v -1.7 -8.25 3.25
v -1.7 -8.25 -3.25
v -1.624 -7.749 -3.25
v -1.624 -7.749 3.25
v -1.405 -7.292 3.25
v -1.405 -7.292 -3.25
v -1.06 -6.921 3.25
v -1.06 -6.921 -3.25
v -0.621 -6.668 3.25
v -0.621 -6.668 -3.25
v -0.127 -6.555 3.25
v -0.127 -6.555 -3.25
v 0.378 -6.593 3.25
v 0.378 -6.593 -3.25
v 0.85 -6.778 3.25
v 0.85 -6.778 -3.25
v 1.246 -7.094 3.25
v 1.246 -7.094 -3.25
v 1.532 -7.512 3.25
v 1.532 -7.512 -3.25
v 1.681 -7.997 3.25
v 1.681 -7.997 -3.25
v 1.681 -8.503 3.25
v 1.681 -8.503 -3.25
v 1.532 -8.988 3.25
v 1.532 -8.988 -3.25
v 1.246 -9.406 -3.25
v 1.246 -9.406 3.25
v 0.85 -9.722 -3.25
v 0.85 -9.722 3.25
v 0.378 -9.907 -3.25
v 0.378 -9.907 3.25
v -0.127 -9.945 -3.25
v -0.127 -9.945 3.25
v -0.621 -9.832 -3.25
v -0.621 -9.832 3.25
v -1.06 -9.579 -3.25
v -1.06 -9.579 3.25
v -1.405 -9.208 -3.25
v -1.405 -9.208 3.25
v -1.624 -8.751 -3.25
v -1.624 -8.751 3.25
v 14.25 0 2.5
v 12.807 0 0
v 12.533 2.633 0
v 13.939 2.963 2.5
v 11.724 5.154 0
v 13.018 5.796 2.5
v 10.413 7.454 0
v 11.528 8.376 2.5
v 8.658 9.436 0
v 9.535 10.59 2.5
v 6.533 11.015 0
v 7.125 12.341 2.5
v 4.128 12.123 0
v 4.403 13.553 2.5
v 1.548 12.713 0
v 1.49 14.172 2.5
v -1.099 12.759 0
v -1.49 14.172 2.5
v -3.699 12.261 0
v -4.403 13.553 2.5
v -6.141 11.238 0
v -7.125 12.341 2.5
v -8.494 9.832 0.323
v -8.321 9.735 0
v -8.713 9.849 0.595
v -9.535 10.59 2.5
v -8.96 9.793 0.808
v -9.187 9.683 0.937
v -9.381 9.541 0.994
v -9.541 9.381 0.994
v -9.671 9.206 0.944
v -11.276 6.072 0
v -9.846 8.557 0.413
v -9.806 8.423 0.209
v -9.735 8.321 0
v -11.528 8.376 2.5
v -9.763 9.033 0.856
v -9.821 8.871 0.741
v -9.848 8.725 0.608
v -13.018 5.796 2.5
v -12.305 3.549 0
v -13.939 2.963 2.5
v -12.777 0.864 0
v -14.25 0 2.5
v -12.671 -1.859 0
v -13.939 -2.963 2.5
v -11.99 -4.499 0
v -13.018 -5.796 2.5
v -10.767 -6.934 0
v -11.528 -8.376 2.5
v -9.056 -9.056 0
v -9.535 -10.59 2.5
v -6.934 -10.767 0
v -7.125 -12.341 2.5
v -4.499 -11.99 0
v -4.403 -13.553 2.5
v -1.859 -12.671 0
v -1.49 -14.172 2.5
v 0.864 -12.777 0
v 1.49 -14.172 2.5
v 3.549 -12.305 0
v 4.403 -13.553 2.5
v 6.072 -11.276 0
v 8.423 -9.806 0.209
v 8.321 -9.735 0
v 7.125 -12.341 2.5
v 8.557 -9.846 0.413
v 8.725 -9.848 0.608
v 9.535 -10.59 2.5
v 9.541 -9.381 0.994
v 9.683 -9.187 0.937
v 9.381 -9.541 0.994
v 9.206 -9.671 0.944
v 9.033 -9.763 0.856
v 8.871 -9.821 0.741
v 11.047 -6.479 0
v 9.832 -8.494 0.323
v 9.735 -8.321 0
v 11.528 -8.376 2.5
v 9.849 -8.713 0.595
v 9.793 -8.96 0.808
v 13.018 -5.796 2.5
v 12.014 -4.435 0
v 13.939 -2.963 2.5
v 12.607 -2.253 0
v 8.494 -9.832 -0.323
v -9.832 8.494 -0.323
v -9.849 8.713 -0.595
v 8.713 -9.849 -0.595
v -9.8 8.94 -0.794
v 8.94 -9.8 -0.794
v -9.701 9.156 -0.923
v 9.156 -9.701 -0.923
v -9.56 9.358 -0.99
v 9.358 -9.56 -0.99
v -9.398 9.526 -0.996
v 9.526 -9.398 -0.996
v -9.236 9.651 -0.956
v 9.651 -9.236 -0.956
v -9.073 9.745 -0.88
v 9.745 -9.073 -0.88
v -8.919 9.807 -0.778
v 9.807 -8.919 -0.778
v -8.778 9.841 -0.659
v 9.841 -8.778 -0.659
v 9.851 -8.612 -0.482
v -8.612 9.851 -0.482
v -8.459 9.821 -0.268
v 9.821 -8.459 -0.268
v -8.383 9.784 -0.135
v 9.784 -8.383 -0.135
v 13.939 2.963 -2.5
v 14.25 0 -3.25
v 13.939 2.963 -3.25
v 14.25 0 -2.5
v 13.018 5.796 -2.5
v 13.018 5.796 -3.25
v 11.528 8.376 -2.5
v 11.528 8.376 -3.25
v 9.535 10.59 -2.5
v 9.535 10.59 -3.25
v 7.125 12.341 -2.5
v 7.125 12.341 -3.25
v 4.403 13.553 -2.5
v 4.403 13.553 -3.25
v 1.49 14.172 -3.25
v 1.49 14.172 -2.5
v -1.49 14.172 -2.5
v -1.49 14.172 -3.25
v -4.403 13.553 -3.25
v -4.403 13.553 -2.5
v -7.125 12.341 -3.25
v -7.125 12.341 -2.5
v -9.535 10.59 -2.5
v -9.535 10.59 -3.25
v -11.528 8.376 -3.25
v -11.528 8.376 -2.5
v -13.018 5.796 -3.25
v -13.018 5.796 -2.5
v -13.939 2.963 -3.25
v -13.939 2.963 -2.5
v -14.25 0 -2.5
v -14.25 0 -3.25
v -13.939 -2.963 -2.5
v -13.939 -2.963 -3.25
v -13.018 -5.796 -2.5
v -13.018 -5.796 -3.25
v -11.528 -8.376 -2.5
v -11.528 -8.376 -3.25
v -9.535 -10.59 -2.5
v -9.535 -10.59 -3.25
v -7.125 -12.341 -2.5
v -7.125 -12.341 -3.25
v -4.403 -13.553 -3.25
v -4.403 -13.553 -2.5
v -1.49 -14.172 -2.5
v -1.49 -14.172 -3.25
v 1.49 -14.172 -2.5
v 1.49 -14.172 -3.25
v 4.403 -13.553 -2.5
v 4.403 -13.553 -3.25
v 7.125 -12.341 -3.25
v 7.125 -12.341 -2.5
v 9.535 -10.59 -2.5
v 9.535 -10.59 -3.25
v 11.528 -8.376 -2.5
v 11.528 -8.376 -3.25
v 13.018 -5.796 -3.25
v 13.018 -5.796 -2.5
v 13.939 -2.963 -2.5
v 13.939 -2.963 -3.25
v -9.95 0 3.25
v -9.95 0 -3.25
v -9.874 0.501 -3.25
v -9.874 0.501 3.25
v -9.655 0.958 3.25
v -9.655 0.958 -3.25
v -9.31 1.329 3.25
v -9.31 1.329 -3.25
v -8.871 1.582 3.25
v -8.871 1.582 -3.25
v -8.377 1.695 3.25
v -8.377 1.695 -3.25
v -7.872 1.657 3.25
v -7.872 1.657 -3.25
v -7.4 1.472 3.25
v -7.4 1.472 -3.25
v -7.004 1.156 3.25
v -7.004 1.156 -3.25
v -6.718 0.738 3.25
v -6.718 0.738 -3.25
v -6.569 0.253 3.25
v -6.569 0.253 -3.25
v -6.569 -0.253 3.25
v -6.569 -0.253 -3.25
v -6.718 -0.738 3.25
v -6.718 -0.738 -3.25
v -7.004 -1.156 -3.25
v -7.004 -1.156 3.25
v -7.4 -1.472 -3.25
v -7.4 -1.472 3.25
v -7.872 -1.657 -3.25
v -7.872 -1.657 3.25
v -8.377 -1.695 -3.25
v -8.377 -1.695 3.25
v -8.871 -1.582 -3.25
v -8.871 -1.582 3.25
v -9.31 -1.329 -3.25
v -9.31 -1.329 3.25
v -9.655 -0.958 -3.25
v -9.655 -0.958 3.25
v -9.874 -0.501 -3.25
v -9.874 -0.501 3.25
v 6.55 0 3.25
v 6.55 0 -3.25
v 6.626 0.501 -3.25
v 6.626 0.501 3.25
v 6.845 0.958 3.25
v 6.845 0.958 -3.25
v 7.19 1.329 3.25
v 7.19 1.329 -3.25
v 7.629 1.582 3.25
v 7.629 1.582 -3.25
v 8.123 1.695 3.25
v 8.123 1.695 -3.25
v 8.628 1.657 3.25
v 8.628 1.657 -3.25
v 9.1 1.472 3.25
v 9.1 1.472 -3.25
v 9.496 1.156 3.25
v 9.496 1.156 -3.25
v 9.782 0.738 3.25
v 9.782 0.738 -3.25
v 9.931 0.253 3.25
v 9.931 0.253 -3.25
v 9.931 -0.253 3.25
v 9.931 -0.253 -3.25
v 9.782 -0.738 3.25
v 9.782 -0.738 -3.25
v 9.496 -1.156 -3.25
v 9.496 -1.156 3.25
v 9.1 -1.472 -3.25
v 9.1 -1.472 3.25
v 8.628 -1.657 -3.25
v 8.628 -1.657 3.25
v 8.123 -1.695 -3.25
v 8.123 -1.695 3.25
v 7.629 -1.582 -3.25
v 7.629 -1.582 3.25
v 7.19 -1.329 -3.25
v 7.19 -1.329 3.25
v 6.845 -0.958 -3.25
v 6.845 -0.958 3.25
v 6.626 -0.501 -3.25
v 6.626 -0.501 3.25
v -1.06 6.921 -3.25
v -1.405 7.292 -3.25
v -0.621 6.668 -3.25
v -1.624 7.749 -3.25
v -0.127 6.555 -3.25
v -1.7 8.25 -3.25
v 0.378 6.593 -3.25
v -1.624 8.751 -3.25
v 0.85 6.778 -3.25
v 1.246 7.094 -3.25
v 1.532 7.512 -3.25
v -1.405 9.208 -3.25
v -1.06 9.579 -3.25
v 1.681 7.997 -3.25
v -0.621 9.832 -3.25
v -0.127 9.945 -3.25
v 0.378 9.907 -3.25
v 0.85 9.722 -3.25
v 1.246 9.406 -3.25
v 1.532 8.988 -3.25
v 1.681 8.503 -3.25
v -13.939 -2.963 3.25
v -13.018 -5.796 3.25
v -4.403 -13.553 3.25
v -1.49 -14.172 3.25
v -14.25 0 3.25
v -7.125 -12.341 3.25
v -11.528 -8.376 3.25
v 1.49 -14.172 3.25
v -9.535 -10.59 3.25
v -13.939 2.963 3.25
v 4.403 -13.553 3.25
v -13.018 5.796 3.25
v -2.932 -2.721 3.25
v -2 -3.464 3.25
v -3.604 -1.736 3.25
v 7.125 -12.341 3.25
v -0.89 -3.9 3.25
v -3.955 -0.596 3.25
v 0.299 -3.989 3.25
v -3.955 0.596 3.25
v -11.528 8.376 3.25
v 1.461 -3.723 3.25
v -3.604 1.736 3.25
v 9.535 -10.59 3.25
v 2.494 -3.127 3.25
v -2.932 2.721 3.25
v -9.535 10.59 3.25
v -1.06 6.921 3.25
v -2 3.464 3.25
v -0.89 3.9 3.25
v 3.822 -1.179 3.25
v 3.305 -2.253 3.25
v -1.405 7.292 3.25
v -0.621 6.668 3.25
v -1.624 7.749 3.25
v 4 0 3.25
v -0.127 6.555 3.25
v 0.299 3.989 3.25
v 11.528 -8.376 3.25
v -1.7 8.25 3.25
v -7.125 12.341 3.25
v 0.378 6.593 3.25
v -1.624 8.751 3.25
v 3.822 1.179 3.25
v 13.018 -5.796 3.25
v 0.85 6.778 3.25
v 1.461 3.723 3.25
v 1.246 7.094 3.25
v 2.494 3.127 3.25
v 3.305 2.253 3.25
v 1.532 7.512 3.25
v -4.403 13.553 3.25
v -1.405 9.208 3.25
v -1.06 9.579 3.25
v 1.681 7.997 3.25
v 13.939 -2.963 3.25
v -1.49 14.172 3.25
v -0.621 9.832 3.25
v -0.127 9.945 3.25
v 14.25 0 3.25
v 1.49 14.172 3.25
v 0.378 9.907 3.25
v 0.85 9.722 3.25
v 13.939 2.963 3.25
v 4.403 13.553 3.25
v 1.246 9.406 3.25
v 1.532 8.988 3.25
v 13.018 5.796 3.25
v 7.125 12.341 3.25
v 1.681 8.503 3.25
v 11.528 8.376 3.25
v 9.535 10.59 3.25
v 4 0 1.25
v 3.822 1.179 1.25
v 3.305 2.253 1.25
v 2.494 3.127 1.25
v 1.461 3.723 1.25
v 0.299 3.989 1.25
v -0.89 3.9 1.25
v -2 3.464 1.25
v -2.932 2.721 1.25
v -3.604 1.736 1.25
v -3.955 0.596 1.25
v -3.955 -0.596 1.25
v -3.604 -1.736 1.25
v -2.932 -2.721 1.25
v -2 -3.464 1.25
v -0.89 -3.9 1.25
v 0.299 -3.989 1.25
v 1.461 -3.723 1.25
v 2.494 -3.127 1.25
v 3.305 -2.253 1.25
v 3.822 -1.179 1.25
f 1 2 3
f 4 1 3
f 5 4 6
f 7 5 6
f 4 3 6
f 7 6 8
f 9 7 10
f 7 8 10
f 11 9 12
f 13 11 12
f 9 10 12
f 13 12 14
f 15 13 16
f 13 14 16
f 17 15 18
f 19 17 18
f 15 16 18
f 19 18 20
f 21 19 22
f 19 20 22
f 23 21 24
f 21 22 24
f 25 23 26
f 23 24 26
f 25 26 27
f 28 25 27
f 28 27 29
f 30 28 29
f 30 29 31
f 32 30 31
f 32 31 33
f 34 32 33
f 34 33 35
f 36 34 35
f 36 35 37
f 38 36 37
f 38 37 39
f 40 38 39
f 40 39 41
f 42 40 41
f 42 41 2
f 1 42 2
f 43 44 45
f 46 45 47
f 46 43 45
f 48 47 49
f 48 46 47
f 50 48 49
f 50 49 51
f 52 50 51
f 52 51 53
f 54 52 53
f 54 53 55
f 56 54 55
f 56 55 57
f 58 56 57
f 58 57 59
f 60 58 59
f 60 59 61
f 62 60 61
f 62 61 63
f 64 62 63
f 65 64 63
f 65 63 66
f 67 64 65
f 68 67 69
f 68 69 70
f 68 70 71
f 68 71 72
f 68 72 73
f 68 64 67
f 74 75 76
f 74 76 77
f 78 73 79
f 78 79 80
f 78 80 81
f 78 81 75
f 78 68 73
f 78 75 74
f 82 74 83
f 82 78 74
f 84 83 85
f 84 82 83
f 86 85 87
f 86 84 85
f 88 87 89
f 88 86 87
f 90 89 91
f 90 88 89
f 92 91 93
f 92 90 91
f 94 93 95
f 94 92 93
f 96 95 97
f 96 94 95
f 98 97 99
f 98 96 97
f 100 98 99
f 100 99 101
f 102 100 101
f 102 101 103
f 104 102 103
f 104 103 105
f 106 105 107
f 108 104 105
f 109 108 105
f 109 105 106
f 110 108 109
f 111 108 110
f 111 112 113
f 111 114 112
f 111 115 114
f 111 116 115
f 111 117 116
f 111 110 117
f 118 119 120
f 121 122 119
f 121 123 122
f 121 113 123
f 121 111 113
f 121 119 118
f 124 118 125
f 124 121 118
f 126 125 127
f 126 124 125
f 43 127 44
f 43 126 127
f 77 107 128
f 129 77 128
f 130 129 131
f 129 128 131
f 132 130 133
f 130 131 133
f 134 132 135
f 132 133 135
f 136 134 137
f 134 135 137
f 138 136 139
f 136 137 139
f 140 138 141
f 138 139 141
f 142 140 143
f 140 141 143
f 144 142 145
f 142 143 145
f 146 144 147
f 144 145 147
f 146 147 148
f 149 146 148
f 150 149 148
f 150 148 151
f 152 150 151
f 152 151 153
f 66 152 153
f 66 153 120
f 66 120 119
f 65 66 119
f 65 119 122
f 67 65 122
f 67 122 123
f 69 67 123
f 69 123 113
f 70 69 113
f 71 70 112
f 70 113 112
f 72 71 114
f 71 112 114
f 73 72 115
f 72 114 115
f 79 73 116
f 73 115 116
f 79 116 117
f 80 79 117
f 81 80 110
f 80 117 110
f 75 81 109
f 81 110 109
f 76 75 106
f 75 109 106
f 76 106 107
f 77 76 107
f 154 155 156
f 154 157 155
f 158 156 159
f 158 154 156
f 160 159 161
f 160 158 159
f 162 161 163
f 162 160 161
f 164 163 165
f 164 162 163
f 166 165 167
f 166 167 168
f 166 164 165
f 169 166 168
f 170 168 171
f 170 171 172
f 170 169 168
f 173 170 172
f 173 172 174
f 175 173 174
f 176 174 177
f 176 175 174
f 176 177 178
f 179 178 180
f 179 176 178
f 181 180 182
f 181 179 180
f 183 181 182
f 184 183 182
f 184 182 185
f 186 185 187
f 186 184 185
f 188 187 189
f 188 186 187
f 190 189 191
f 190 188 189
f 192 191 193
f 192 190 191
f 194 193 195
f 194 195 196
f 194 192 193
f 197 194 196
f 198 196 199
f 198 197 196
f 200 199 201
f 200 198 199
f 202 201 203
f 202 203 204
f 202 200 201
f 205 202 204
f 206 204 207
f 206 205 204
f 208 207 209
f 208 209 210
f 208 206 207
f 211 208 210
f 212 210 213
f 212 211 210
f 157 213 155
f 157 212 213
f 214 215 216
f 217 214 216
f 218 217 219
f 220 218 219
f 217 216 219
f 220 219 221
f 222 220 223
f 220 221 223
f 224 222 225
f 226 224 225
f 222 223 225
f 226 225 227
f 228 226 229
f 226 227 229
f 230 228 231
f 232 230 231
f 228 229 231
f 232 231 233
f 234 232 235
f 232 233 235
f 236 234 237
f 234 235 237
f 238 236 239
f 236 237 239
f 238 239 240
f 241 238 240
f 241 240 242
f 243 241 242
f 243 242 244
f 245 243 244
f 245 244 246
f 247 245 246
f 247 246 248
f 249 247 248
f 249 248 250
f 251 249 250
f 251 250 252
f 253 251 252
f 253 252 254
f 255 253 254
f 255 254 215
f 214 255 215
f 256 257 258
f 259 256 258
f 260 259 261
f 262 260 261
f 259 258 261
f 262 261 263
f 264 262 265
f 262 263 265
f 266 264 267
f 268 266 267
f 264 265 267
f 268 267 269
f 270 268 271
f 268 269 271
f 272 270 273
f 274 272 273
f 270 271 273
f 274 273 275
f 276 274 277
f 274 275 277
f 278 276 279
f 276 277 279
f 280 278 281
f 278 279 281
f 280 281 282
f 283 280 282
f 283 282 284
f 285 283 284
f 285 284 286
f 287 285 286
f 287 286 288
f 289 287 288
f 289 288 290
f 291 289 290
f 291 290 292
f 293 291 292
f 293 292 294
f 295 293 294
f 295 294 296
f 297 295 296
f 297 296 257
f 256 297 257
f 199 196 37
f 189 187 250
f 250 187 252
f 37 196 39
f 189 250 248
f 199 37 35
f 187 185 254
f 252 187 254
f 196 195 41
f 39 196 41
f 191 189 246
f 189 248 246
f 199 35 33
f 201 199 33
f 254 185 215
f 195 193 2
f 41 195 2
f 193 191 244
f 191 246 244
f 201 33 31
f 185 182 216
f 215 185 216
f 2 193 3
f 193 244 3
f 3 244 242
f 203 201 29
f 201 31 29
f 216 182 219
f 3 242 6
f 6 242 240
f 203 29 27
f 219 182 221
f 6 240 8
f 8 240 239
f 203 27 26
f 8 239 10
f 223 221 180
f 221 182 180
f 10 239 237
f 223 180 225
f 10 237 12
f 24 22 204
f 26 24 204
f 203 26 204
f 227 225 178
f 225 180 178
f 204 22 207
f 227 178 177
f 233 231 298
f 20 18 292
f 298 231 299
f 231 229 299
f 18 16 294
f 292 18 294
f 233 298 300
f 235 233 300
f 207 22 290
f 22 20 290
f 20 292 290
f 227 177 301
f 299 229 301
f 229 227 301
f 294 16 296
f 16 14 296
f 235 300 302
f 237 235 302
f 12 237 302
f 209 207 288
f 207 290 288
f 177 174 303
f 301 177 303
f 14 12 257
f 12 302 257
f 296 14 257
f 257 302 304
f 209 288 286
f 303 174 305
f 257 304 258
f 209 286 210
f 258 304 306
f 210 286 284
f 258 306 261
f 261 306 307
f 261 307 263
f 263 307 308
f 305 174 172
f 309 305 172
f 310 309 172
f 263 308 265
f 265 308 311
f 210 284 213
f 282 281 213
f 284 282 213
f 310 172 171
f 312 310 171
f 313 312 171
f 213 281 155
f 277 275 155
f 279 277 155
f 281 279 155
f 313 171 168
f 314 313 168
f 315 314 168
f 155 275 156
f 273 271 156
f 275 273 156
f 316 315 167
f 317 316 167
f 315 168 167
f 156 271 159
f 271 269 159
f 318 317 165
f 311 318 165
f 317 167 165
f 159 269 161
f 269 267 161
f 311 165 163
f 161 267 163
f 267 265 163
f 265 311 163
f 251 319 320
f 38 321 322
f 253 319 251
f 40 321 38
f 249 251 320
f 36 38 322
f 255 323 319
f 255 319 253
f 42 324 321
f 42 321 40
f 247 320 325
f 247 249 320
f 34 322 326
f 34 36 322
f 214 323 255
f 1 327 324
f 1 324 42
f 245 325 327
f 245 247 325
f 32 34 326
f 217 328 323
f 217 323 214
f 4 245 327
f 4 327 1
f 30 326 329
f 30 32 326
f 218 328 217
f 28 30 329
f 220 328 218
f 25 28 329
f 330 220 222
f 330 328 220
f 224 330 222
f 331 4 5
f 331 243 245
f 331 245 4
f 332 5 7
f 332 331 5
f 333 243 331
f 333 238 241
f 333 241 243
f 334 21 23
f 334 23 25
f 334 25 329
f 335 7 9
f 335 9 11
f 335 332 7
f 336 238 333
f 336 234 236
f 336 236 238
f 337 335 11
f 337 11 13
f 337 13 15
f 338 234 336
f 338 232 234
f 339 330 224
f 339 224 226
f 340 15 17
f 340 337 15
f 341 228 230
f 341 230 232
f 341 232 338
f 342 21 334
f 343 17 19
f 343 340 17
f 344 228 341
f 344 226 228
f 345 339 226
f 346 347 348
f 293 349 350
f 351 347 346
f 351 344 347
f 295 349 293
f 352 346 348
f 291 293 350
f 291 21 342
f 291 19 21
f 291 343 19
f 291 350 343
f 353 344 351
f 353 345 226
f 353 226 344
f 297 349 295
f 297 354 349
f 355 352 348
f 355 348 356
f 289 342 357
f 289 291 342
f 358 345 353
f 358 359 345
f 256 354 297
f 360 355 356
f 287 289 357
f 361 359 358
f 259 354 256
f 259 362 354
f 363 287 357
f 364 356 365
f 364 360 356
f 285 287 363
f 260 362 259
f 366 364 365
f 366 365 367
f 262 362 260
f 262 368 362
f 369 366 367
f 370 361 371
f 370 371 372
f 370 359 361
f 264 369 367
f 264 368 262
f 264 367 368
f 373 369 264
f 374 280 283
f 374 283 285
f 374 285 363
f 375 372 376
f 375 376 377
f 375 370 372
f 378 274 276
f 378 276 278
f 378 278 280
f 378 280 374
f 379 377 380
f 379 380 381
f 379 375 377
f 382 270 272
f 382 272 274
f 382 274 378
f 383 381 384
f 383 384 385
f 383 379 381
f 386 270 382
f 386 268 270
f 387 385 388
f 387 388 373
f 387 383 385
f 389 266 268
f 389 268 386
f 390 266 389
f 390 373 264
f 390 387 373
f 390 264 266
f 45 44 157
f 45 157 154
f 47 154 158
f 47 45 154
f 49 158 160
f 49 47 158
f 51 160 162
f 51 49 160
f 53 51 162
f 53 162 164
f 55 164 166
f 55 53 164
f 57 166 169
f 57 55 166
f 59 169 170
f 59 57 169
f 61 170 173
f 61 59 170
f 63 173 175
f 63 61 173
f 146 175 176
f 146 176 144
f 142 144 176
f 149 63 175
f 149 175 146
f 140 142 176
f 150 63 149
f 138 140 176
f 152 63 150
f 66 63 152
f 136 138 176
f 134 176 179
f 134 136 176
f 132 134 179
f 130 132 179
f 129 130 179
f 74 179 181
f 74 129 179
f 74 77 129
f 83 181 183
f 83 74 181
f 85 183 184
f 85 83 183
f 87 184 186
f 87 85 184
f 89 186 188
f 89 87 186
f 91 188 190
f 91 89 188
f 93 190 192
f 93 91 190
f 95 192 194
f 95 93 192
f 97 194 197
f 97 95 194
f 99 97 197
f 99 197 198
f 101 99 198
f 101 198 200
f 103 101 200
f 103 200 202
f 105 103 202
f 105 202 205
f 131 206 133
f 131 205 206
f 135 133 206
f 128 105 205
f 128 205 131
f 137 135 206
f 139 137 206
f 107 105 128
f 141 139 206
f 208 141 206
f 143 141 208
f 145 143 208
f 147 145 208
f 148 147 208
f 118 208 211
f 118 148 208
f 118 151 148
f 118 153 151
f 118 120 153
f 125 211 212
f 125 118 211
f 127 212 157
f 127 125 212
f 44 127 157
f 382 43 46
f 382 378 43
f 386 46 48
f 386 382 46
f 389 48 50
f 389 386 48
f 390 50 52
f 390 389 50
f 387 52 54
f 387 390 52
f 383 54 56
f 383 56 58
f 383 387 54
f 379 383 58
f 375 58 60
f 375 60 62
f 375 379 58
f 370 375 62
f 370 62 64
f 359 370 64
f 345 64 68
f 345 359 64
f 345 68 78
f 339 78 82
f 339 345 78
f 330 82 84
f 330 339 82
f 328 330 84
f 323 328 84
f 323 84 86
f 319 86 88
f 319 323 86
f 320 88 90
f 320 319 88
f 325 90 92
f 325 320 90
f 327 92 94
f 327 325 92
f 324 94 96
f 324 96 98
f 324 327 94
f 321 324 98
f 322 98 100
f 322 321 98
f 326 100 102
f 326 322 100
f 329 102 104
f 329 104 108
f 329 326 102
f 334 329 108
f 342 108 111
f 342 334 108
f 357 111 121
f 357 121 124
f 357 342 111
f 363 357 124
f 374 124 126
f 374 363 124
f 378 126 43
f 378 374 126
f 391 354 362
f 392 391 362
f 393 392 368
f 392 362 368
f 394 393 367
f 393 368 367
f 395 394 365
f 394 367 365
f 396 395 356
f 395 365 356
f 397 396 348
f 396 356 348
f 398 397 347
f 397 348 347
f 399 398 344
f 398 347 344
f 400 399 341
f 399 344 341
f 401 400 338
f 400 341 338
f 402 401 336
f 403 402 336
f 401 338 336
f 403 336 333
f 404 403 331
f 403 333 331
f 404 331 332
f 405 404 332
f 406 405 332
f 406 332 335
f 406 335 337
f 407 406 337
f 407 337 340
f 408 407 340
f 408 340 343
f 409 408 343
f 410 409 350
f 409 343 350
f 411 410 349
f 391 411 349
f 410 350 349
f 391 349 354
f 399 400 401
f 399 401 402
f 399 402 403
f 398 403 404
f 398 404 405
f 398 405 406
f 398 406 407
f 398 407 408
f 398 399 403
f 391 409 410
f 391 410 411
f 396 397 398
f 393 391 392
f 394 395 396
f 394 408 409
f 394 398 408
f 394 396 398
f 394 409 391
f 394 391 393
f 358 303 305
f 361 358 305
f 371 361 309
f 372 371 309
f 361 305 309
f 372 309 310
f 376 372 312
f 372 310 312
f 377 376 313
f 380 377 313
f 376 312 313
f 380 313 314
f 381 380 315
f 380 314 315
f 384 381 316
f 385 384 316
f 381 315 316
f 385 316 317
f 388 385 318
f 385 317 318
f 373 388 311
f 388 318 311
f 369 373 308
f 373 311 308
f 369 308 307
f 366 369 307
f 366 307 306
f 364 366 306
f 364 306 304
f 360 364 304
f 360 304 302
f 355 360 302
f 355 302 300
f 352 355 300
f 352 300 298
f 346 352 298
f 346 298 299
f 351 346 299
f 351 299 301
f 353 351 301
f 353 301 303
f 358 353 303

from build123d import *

# Parameters (mm, degrees)
ESQUISSE2_R                  = 14.25
BOSS_EXTRU_1_DEPTH           = 3.25
ESQUISSE3_R                  = 1.2
ENL_V_MAT_EXTRU_1_DEPTH      = 4.25
ESQUISSE10_R                 = 1.7
ENL_V_MAT_EXTRU_2_DEPTH      = 1
ENL_V_MAT_EXTRU_2_DEPTH_BACK = 7.5
ESQUISSE17_R                 = 4
ENL_V_MAT_EXTRU_8_DEPTH      = 2
ESQUISSE13_R                 = 1
ENL_V_MAT_EXTRU_4_DEPTH      = 35.402543264


with BuildPart() as part:
    # Esquisse2 → Boss.-Extru.1 (new body, symmetric)
    with BuildSketch(Plane.XY):
        Circle(ESQUISSE2_R)
    extrude(amount=BOSS_EXTRU_1_DEPTH, both=True)

    # Esquisse3 → Enlèv. mat.-Extru.1 (cut, through all)
    with BuildSketch(Plane.XY):
        with Locations((0, 8.25)):
            Circle(ESQUISSE3_R)
        with Locations((-8.25, 0)):
            Circle(ESQUISSE3_R)
        with Locations((0, -8.25)):
            Circle(ESQUISSE3_R)
        with Locations((8.25, 0)):
            Circle(ESQUISSE3_R)
    extrude(amount=ENL_V_MAT_EXTRU_1_DEPTH, mode=Mode.SUBTRACT)

    # Esquisse10 → Enlèv. mat.-Extru.2 (cut, two sides)
    with BuildSketch(Plane(origin=(0, 0, -3.25), x_dir=(-1, 0, 0), z_dir=(0, 0, -1))) as enl_v_mat_extru_2_sk:
        with Locations((-8.25, 0)):
            Circle(ESQUISSE10_R)
        with Locations((0, 8.25)):
            Circle(ESQUISSE10_R)
        with Locations((8.25, 0)):
            Circle(ESQUISSE10_R)
        with Locations((0, -8.25)):
            Circle(ESQUISSE10_R)
    extrude(amount=ENL_V_MAT_EXTRU_2_DEPTH, mode=Mode.SUBTRACT)
    extrude(enl_v_mat_extru_2_sk.sketch, amount=-ENL_V_MAT_EXTRU_2_DEPTH_BACK, mode=Mode.SUBTRACT)

    # Esquisse17 → Enlèv. mat.-Extru.8 (cut)
    with BuildSketch(Plane.XY.offset(3.25)):
        Circle(ESQUISSE17_R)
    extrude(amount=-ENL_V_MAT_EXTRU_8_DEPTH, mode=Mode.SUBTRACT)

    # Esquisse13 → Enlèv. mat.-Extru.4 (cut, through all)
    with BuildSketch(Plane(origin=(10.076271632, -10.076271632, 0), x_dir=(-0.707106781, -0.707106781, 0), z_dir=(0.707106781, -0.707106781, 0))):
        Circle(ESQUISSE13_R)
    extrude(amount=-ENL_V_MAT_EXTRU_4_DEPTH, mode=Mode.SUBTRACT)

    # Esquisse18 → Enlèvement de matière-Révolution1 (revolve, cut)
    with BuildSketch(Plane(origin=(0, 0, 0), x_dir=(1, 0, 0), z_dir=(0, 1, 0))):
        Polygon((14.25, 2.5), (12.806624327, 0), (14.25, -2.5), align=None)
    revolve(axis=Axis((0, 0, -3.25), (0, 0, 1)), mode=Mode.SUBTRACT)


solid = part.part
